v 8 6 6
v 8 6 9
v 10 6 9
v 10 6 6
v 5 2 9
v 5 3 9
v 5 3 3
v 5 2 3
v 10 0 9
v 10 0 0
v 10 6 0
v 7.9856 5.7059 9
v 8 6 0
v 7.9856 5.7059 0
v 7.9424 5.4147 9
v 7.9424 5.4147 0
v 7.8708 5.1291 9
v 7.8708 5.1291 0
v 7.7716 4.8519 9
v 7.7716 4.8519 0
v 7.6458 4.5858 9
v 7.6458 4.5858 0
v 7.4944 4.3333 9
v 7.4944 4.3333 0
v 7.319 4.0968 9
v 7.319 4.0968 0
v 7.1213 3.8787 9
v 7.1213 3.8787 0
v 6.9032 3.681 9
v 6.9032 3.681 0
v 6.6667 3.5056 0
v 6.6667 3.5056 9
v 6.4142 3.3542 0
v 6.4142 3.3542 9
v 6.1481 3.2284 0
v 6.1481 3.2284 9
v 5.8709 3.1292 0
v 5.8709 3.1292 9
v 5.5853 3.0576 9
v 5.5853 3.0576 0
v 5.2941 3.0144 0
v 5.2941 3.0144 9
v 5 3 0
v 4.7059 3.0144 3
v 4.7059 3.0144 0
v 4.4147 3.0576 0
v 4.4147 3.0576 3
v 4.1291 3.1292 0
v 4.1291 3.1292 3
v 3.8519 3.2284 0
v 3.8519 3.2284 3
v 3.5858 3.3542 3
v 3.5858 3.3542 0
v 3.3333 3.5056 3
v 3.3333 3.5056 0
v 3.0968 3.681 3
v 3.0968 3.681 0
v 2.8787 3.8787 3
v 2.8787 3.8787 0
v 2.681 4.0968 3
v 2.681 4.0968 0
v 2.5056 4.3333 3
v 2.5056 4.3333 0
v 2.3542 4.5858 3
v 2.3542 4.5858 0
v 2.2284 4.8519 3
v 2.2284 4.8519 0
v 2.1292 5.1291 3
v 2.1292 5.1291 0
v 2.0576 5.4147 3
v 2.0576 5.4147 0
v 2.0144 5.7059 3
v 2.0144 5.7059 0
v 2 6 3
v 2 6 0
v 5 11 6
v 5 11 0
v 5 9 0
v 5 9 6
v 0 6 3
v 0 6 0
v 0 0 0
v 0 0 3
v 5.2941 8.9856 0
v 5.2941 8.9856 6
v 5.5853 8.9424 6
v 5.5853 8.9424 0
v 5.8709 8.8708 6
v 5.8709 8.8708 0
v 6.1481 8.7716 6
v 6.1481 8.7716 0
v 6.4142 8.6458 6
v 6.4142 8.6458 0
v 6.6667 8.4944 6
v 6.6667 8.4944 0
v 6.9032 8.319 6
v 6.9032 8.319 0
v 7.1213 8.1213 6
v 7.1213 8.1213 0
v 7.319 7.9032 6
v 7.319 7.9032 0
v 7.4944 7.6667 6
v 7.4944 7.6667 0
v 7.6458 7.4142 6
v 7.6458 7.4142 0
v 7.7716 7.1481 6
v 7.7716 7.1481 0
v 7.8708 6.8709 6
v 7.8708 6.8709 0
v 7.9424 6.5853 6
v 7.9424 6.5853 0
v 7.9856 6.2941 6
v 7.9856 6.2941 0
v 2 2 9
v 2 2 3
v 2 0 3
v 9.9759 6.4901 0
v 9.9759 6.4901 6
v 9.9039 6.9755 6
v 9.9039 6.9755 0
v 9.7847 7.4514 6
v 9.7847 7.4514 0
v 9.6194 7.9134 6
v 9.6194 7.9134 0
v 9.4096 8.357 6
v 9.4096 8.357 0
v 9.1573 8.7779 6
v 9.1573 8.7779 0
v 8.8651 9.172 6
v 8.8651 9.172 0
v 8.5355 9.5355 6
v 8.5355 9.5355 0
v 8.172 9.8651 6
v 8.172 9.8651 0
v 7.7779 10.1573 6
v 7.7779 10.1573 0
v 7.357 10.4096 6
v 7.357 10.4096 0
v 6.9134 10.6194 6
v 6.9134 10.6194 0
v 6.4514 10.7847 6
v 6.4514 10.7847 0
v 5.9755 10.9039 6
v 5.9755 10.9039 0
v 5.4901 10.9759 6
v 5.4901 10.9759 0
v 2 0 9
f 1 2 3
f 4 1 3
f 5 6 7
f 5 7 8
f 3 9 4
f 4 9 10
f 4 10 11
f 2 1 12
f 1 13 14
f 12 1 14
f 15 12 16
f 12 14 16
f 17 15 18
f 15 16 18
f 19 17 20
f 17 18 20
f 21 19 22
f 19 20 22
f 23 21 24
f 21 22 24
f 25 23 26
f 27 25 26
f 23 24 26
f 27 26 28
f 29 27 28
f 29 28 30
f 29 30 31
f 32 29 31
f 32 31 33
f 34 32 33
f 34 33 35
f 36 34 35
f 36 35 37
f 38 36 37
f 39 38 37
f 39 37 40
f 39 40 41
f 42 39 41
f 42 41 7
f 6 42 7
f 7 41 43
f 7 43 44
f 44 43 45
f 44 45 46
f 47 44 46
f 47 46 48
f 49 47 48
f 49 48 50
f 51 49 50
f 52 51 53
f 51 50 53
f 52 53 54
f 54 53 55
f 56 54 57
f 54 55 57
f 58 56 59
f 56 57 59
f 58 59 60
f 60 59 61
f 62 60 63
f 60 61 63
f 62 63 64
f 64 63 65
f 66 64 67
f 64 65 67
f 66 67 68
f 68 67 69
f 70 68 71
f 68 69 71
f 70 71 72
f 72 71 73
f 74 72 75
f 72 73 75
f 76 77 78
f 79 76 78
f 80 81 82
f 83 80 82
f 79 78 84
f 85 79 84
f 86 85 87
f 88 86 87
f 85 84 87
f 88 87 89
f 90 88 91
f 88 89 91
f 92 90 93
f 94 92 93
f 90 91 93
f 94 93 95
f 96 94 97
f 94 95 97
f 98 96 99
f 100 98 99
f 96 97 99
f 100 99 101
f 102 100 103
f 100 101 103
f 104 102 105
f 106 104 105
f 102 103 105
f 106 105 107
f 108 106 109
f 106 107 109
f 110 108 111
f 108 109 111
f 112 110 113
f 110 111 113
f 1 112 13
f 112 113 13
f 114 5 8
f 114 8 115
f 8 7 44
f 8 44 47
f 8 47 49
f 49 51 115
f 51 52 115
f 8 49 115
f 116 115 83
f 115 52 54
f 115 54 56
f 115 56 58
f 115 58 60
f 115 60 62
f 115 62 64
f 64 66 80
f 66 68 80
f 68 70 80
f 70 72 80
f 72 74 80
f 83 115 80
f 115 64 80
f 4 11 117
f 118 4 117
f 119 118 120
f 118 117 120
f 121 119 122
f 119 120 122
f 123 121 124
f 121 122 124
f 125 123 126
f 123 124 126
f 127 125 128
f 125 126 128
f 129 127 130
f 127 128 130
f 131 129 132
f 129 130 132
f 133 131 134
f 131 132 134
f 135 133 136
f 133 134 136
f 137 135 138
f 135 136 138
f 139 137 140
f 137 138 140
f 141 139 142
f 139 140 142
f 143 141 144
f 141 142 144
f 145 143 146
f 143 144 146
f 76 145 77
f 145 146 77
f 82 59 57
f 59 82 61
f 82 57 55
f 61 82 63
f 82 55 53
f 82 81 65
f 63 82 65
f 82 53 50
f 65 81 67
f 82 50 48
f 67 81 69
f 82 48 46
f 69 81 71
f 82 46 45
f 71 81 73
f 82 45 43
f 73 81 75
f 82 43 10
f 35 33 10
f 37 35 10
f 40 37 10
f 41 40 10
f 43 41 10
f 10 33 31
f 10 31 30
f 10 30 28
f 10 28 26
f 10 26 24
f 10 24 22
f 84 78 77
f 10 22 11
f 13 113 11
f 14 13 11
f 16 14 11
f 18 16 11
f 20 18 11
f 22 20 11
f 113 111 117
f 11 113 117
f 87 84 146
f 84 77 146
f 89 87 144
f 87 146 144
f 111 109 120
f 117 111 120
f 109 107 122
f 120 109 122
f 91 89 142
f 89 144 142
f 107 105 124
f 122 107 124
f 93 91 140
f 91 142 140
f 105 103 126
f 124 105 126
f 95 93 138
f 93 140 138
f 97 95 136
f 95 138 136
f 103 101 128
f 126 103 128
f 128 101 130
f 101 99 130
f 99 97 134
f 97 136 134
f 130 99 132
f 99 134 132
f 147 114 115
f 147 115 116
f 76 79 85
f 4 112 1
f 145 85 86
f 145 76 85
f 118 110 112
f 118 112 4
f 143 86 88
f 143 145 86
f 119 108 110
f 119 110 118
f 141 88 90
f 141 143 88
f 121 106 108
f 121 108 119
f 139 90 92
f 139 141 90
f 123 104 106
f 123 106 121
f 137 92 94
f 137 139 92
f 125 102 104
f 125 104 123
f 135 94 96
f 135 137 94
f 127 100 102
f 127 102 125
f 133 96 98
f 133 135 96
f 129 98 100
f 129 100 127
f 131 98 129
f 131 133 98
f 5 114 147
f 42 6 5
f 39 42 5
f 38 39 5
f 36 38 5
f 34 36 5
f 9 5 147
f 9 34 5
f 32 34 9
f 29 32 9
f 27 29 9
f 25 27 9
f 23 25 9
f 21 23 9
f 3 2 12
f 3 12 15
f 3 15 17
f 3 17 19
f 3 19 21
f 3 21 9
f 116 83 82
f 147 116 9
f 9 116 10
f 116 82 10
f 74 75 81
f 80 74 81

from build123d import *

# Parameters (mm, degrees)
BOSS_EXTRUDE1_DEPTH = 9
SKETCH2_W           = 5
SKETCH2_H           = 5
CUT_EXTRUDE1_DEPTH  = 3
CUT_EXTRUDE2_DEPTH  = 6


with BuildPart() as part:
    # Sketch1 → Boss-Extrude1 (new body)
    with BuildSketch(Plane.XY):
        with BuildLine():
            ThreePointArc((10, 6), (8.535533906, 9.535533906), (5, 11))
            Line((5, 11), (5, 9))
            ThreePointArc((5, 9), (7.121320344, 8.121320344), (8, 6))
            ThreePointArc((8, 6), (5, 3), (2, 6))
            Line((2, 6), (0, 6))
            Line((0, 6), (0, 0))
            Line((0, 0), (10, 0))
            Line((10, 0), (10, 6))
        make_face()
    extrude(amount=BOSS_EXTRUDE1_DEPTH)

    # Sketch2 → Cut-Extrude1 (cut)
    with BuildSketch(Plane.XY.offset(9)):
        with Locations((7.5, 8.5)):
            Rectangle(SKETCH2_W, SKETCH2_H)
    extrude(amount=-CUT_EXTRUDE1_DEPTH, mode=Mode.SUBTRACT)

    # Sketch3 → Cut-Extrude2 (cut)
    with BuildSketch(Plane.XY.offset(9)):
        Polygon((5, 3), (5, 2), (2, 2), (2, 0), (0, 0), (0, 6.616008908), (4.654546825, 5.714332837), align=None)
    extrude(amount=-CUT_EXTRUDE2_DEPTH, mode=Mode.SUBTRACT)


solid = part.part
